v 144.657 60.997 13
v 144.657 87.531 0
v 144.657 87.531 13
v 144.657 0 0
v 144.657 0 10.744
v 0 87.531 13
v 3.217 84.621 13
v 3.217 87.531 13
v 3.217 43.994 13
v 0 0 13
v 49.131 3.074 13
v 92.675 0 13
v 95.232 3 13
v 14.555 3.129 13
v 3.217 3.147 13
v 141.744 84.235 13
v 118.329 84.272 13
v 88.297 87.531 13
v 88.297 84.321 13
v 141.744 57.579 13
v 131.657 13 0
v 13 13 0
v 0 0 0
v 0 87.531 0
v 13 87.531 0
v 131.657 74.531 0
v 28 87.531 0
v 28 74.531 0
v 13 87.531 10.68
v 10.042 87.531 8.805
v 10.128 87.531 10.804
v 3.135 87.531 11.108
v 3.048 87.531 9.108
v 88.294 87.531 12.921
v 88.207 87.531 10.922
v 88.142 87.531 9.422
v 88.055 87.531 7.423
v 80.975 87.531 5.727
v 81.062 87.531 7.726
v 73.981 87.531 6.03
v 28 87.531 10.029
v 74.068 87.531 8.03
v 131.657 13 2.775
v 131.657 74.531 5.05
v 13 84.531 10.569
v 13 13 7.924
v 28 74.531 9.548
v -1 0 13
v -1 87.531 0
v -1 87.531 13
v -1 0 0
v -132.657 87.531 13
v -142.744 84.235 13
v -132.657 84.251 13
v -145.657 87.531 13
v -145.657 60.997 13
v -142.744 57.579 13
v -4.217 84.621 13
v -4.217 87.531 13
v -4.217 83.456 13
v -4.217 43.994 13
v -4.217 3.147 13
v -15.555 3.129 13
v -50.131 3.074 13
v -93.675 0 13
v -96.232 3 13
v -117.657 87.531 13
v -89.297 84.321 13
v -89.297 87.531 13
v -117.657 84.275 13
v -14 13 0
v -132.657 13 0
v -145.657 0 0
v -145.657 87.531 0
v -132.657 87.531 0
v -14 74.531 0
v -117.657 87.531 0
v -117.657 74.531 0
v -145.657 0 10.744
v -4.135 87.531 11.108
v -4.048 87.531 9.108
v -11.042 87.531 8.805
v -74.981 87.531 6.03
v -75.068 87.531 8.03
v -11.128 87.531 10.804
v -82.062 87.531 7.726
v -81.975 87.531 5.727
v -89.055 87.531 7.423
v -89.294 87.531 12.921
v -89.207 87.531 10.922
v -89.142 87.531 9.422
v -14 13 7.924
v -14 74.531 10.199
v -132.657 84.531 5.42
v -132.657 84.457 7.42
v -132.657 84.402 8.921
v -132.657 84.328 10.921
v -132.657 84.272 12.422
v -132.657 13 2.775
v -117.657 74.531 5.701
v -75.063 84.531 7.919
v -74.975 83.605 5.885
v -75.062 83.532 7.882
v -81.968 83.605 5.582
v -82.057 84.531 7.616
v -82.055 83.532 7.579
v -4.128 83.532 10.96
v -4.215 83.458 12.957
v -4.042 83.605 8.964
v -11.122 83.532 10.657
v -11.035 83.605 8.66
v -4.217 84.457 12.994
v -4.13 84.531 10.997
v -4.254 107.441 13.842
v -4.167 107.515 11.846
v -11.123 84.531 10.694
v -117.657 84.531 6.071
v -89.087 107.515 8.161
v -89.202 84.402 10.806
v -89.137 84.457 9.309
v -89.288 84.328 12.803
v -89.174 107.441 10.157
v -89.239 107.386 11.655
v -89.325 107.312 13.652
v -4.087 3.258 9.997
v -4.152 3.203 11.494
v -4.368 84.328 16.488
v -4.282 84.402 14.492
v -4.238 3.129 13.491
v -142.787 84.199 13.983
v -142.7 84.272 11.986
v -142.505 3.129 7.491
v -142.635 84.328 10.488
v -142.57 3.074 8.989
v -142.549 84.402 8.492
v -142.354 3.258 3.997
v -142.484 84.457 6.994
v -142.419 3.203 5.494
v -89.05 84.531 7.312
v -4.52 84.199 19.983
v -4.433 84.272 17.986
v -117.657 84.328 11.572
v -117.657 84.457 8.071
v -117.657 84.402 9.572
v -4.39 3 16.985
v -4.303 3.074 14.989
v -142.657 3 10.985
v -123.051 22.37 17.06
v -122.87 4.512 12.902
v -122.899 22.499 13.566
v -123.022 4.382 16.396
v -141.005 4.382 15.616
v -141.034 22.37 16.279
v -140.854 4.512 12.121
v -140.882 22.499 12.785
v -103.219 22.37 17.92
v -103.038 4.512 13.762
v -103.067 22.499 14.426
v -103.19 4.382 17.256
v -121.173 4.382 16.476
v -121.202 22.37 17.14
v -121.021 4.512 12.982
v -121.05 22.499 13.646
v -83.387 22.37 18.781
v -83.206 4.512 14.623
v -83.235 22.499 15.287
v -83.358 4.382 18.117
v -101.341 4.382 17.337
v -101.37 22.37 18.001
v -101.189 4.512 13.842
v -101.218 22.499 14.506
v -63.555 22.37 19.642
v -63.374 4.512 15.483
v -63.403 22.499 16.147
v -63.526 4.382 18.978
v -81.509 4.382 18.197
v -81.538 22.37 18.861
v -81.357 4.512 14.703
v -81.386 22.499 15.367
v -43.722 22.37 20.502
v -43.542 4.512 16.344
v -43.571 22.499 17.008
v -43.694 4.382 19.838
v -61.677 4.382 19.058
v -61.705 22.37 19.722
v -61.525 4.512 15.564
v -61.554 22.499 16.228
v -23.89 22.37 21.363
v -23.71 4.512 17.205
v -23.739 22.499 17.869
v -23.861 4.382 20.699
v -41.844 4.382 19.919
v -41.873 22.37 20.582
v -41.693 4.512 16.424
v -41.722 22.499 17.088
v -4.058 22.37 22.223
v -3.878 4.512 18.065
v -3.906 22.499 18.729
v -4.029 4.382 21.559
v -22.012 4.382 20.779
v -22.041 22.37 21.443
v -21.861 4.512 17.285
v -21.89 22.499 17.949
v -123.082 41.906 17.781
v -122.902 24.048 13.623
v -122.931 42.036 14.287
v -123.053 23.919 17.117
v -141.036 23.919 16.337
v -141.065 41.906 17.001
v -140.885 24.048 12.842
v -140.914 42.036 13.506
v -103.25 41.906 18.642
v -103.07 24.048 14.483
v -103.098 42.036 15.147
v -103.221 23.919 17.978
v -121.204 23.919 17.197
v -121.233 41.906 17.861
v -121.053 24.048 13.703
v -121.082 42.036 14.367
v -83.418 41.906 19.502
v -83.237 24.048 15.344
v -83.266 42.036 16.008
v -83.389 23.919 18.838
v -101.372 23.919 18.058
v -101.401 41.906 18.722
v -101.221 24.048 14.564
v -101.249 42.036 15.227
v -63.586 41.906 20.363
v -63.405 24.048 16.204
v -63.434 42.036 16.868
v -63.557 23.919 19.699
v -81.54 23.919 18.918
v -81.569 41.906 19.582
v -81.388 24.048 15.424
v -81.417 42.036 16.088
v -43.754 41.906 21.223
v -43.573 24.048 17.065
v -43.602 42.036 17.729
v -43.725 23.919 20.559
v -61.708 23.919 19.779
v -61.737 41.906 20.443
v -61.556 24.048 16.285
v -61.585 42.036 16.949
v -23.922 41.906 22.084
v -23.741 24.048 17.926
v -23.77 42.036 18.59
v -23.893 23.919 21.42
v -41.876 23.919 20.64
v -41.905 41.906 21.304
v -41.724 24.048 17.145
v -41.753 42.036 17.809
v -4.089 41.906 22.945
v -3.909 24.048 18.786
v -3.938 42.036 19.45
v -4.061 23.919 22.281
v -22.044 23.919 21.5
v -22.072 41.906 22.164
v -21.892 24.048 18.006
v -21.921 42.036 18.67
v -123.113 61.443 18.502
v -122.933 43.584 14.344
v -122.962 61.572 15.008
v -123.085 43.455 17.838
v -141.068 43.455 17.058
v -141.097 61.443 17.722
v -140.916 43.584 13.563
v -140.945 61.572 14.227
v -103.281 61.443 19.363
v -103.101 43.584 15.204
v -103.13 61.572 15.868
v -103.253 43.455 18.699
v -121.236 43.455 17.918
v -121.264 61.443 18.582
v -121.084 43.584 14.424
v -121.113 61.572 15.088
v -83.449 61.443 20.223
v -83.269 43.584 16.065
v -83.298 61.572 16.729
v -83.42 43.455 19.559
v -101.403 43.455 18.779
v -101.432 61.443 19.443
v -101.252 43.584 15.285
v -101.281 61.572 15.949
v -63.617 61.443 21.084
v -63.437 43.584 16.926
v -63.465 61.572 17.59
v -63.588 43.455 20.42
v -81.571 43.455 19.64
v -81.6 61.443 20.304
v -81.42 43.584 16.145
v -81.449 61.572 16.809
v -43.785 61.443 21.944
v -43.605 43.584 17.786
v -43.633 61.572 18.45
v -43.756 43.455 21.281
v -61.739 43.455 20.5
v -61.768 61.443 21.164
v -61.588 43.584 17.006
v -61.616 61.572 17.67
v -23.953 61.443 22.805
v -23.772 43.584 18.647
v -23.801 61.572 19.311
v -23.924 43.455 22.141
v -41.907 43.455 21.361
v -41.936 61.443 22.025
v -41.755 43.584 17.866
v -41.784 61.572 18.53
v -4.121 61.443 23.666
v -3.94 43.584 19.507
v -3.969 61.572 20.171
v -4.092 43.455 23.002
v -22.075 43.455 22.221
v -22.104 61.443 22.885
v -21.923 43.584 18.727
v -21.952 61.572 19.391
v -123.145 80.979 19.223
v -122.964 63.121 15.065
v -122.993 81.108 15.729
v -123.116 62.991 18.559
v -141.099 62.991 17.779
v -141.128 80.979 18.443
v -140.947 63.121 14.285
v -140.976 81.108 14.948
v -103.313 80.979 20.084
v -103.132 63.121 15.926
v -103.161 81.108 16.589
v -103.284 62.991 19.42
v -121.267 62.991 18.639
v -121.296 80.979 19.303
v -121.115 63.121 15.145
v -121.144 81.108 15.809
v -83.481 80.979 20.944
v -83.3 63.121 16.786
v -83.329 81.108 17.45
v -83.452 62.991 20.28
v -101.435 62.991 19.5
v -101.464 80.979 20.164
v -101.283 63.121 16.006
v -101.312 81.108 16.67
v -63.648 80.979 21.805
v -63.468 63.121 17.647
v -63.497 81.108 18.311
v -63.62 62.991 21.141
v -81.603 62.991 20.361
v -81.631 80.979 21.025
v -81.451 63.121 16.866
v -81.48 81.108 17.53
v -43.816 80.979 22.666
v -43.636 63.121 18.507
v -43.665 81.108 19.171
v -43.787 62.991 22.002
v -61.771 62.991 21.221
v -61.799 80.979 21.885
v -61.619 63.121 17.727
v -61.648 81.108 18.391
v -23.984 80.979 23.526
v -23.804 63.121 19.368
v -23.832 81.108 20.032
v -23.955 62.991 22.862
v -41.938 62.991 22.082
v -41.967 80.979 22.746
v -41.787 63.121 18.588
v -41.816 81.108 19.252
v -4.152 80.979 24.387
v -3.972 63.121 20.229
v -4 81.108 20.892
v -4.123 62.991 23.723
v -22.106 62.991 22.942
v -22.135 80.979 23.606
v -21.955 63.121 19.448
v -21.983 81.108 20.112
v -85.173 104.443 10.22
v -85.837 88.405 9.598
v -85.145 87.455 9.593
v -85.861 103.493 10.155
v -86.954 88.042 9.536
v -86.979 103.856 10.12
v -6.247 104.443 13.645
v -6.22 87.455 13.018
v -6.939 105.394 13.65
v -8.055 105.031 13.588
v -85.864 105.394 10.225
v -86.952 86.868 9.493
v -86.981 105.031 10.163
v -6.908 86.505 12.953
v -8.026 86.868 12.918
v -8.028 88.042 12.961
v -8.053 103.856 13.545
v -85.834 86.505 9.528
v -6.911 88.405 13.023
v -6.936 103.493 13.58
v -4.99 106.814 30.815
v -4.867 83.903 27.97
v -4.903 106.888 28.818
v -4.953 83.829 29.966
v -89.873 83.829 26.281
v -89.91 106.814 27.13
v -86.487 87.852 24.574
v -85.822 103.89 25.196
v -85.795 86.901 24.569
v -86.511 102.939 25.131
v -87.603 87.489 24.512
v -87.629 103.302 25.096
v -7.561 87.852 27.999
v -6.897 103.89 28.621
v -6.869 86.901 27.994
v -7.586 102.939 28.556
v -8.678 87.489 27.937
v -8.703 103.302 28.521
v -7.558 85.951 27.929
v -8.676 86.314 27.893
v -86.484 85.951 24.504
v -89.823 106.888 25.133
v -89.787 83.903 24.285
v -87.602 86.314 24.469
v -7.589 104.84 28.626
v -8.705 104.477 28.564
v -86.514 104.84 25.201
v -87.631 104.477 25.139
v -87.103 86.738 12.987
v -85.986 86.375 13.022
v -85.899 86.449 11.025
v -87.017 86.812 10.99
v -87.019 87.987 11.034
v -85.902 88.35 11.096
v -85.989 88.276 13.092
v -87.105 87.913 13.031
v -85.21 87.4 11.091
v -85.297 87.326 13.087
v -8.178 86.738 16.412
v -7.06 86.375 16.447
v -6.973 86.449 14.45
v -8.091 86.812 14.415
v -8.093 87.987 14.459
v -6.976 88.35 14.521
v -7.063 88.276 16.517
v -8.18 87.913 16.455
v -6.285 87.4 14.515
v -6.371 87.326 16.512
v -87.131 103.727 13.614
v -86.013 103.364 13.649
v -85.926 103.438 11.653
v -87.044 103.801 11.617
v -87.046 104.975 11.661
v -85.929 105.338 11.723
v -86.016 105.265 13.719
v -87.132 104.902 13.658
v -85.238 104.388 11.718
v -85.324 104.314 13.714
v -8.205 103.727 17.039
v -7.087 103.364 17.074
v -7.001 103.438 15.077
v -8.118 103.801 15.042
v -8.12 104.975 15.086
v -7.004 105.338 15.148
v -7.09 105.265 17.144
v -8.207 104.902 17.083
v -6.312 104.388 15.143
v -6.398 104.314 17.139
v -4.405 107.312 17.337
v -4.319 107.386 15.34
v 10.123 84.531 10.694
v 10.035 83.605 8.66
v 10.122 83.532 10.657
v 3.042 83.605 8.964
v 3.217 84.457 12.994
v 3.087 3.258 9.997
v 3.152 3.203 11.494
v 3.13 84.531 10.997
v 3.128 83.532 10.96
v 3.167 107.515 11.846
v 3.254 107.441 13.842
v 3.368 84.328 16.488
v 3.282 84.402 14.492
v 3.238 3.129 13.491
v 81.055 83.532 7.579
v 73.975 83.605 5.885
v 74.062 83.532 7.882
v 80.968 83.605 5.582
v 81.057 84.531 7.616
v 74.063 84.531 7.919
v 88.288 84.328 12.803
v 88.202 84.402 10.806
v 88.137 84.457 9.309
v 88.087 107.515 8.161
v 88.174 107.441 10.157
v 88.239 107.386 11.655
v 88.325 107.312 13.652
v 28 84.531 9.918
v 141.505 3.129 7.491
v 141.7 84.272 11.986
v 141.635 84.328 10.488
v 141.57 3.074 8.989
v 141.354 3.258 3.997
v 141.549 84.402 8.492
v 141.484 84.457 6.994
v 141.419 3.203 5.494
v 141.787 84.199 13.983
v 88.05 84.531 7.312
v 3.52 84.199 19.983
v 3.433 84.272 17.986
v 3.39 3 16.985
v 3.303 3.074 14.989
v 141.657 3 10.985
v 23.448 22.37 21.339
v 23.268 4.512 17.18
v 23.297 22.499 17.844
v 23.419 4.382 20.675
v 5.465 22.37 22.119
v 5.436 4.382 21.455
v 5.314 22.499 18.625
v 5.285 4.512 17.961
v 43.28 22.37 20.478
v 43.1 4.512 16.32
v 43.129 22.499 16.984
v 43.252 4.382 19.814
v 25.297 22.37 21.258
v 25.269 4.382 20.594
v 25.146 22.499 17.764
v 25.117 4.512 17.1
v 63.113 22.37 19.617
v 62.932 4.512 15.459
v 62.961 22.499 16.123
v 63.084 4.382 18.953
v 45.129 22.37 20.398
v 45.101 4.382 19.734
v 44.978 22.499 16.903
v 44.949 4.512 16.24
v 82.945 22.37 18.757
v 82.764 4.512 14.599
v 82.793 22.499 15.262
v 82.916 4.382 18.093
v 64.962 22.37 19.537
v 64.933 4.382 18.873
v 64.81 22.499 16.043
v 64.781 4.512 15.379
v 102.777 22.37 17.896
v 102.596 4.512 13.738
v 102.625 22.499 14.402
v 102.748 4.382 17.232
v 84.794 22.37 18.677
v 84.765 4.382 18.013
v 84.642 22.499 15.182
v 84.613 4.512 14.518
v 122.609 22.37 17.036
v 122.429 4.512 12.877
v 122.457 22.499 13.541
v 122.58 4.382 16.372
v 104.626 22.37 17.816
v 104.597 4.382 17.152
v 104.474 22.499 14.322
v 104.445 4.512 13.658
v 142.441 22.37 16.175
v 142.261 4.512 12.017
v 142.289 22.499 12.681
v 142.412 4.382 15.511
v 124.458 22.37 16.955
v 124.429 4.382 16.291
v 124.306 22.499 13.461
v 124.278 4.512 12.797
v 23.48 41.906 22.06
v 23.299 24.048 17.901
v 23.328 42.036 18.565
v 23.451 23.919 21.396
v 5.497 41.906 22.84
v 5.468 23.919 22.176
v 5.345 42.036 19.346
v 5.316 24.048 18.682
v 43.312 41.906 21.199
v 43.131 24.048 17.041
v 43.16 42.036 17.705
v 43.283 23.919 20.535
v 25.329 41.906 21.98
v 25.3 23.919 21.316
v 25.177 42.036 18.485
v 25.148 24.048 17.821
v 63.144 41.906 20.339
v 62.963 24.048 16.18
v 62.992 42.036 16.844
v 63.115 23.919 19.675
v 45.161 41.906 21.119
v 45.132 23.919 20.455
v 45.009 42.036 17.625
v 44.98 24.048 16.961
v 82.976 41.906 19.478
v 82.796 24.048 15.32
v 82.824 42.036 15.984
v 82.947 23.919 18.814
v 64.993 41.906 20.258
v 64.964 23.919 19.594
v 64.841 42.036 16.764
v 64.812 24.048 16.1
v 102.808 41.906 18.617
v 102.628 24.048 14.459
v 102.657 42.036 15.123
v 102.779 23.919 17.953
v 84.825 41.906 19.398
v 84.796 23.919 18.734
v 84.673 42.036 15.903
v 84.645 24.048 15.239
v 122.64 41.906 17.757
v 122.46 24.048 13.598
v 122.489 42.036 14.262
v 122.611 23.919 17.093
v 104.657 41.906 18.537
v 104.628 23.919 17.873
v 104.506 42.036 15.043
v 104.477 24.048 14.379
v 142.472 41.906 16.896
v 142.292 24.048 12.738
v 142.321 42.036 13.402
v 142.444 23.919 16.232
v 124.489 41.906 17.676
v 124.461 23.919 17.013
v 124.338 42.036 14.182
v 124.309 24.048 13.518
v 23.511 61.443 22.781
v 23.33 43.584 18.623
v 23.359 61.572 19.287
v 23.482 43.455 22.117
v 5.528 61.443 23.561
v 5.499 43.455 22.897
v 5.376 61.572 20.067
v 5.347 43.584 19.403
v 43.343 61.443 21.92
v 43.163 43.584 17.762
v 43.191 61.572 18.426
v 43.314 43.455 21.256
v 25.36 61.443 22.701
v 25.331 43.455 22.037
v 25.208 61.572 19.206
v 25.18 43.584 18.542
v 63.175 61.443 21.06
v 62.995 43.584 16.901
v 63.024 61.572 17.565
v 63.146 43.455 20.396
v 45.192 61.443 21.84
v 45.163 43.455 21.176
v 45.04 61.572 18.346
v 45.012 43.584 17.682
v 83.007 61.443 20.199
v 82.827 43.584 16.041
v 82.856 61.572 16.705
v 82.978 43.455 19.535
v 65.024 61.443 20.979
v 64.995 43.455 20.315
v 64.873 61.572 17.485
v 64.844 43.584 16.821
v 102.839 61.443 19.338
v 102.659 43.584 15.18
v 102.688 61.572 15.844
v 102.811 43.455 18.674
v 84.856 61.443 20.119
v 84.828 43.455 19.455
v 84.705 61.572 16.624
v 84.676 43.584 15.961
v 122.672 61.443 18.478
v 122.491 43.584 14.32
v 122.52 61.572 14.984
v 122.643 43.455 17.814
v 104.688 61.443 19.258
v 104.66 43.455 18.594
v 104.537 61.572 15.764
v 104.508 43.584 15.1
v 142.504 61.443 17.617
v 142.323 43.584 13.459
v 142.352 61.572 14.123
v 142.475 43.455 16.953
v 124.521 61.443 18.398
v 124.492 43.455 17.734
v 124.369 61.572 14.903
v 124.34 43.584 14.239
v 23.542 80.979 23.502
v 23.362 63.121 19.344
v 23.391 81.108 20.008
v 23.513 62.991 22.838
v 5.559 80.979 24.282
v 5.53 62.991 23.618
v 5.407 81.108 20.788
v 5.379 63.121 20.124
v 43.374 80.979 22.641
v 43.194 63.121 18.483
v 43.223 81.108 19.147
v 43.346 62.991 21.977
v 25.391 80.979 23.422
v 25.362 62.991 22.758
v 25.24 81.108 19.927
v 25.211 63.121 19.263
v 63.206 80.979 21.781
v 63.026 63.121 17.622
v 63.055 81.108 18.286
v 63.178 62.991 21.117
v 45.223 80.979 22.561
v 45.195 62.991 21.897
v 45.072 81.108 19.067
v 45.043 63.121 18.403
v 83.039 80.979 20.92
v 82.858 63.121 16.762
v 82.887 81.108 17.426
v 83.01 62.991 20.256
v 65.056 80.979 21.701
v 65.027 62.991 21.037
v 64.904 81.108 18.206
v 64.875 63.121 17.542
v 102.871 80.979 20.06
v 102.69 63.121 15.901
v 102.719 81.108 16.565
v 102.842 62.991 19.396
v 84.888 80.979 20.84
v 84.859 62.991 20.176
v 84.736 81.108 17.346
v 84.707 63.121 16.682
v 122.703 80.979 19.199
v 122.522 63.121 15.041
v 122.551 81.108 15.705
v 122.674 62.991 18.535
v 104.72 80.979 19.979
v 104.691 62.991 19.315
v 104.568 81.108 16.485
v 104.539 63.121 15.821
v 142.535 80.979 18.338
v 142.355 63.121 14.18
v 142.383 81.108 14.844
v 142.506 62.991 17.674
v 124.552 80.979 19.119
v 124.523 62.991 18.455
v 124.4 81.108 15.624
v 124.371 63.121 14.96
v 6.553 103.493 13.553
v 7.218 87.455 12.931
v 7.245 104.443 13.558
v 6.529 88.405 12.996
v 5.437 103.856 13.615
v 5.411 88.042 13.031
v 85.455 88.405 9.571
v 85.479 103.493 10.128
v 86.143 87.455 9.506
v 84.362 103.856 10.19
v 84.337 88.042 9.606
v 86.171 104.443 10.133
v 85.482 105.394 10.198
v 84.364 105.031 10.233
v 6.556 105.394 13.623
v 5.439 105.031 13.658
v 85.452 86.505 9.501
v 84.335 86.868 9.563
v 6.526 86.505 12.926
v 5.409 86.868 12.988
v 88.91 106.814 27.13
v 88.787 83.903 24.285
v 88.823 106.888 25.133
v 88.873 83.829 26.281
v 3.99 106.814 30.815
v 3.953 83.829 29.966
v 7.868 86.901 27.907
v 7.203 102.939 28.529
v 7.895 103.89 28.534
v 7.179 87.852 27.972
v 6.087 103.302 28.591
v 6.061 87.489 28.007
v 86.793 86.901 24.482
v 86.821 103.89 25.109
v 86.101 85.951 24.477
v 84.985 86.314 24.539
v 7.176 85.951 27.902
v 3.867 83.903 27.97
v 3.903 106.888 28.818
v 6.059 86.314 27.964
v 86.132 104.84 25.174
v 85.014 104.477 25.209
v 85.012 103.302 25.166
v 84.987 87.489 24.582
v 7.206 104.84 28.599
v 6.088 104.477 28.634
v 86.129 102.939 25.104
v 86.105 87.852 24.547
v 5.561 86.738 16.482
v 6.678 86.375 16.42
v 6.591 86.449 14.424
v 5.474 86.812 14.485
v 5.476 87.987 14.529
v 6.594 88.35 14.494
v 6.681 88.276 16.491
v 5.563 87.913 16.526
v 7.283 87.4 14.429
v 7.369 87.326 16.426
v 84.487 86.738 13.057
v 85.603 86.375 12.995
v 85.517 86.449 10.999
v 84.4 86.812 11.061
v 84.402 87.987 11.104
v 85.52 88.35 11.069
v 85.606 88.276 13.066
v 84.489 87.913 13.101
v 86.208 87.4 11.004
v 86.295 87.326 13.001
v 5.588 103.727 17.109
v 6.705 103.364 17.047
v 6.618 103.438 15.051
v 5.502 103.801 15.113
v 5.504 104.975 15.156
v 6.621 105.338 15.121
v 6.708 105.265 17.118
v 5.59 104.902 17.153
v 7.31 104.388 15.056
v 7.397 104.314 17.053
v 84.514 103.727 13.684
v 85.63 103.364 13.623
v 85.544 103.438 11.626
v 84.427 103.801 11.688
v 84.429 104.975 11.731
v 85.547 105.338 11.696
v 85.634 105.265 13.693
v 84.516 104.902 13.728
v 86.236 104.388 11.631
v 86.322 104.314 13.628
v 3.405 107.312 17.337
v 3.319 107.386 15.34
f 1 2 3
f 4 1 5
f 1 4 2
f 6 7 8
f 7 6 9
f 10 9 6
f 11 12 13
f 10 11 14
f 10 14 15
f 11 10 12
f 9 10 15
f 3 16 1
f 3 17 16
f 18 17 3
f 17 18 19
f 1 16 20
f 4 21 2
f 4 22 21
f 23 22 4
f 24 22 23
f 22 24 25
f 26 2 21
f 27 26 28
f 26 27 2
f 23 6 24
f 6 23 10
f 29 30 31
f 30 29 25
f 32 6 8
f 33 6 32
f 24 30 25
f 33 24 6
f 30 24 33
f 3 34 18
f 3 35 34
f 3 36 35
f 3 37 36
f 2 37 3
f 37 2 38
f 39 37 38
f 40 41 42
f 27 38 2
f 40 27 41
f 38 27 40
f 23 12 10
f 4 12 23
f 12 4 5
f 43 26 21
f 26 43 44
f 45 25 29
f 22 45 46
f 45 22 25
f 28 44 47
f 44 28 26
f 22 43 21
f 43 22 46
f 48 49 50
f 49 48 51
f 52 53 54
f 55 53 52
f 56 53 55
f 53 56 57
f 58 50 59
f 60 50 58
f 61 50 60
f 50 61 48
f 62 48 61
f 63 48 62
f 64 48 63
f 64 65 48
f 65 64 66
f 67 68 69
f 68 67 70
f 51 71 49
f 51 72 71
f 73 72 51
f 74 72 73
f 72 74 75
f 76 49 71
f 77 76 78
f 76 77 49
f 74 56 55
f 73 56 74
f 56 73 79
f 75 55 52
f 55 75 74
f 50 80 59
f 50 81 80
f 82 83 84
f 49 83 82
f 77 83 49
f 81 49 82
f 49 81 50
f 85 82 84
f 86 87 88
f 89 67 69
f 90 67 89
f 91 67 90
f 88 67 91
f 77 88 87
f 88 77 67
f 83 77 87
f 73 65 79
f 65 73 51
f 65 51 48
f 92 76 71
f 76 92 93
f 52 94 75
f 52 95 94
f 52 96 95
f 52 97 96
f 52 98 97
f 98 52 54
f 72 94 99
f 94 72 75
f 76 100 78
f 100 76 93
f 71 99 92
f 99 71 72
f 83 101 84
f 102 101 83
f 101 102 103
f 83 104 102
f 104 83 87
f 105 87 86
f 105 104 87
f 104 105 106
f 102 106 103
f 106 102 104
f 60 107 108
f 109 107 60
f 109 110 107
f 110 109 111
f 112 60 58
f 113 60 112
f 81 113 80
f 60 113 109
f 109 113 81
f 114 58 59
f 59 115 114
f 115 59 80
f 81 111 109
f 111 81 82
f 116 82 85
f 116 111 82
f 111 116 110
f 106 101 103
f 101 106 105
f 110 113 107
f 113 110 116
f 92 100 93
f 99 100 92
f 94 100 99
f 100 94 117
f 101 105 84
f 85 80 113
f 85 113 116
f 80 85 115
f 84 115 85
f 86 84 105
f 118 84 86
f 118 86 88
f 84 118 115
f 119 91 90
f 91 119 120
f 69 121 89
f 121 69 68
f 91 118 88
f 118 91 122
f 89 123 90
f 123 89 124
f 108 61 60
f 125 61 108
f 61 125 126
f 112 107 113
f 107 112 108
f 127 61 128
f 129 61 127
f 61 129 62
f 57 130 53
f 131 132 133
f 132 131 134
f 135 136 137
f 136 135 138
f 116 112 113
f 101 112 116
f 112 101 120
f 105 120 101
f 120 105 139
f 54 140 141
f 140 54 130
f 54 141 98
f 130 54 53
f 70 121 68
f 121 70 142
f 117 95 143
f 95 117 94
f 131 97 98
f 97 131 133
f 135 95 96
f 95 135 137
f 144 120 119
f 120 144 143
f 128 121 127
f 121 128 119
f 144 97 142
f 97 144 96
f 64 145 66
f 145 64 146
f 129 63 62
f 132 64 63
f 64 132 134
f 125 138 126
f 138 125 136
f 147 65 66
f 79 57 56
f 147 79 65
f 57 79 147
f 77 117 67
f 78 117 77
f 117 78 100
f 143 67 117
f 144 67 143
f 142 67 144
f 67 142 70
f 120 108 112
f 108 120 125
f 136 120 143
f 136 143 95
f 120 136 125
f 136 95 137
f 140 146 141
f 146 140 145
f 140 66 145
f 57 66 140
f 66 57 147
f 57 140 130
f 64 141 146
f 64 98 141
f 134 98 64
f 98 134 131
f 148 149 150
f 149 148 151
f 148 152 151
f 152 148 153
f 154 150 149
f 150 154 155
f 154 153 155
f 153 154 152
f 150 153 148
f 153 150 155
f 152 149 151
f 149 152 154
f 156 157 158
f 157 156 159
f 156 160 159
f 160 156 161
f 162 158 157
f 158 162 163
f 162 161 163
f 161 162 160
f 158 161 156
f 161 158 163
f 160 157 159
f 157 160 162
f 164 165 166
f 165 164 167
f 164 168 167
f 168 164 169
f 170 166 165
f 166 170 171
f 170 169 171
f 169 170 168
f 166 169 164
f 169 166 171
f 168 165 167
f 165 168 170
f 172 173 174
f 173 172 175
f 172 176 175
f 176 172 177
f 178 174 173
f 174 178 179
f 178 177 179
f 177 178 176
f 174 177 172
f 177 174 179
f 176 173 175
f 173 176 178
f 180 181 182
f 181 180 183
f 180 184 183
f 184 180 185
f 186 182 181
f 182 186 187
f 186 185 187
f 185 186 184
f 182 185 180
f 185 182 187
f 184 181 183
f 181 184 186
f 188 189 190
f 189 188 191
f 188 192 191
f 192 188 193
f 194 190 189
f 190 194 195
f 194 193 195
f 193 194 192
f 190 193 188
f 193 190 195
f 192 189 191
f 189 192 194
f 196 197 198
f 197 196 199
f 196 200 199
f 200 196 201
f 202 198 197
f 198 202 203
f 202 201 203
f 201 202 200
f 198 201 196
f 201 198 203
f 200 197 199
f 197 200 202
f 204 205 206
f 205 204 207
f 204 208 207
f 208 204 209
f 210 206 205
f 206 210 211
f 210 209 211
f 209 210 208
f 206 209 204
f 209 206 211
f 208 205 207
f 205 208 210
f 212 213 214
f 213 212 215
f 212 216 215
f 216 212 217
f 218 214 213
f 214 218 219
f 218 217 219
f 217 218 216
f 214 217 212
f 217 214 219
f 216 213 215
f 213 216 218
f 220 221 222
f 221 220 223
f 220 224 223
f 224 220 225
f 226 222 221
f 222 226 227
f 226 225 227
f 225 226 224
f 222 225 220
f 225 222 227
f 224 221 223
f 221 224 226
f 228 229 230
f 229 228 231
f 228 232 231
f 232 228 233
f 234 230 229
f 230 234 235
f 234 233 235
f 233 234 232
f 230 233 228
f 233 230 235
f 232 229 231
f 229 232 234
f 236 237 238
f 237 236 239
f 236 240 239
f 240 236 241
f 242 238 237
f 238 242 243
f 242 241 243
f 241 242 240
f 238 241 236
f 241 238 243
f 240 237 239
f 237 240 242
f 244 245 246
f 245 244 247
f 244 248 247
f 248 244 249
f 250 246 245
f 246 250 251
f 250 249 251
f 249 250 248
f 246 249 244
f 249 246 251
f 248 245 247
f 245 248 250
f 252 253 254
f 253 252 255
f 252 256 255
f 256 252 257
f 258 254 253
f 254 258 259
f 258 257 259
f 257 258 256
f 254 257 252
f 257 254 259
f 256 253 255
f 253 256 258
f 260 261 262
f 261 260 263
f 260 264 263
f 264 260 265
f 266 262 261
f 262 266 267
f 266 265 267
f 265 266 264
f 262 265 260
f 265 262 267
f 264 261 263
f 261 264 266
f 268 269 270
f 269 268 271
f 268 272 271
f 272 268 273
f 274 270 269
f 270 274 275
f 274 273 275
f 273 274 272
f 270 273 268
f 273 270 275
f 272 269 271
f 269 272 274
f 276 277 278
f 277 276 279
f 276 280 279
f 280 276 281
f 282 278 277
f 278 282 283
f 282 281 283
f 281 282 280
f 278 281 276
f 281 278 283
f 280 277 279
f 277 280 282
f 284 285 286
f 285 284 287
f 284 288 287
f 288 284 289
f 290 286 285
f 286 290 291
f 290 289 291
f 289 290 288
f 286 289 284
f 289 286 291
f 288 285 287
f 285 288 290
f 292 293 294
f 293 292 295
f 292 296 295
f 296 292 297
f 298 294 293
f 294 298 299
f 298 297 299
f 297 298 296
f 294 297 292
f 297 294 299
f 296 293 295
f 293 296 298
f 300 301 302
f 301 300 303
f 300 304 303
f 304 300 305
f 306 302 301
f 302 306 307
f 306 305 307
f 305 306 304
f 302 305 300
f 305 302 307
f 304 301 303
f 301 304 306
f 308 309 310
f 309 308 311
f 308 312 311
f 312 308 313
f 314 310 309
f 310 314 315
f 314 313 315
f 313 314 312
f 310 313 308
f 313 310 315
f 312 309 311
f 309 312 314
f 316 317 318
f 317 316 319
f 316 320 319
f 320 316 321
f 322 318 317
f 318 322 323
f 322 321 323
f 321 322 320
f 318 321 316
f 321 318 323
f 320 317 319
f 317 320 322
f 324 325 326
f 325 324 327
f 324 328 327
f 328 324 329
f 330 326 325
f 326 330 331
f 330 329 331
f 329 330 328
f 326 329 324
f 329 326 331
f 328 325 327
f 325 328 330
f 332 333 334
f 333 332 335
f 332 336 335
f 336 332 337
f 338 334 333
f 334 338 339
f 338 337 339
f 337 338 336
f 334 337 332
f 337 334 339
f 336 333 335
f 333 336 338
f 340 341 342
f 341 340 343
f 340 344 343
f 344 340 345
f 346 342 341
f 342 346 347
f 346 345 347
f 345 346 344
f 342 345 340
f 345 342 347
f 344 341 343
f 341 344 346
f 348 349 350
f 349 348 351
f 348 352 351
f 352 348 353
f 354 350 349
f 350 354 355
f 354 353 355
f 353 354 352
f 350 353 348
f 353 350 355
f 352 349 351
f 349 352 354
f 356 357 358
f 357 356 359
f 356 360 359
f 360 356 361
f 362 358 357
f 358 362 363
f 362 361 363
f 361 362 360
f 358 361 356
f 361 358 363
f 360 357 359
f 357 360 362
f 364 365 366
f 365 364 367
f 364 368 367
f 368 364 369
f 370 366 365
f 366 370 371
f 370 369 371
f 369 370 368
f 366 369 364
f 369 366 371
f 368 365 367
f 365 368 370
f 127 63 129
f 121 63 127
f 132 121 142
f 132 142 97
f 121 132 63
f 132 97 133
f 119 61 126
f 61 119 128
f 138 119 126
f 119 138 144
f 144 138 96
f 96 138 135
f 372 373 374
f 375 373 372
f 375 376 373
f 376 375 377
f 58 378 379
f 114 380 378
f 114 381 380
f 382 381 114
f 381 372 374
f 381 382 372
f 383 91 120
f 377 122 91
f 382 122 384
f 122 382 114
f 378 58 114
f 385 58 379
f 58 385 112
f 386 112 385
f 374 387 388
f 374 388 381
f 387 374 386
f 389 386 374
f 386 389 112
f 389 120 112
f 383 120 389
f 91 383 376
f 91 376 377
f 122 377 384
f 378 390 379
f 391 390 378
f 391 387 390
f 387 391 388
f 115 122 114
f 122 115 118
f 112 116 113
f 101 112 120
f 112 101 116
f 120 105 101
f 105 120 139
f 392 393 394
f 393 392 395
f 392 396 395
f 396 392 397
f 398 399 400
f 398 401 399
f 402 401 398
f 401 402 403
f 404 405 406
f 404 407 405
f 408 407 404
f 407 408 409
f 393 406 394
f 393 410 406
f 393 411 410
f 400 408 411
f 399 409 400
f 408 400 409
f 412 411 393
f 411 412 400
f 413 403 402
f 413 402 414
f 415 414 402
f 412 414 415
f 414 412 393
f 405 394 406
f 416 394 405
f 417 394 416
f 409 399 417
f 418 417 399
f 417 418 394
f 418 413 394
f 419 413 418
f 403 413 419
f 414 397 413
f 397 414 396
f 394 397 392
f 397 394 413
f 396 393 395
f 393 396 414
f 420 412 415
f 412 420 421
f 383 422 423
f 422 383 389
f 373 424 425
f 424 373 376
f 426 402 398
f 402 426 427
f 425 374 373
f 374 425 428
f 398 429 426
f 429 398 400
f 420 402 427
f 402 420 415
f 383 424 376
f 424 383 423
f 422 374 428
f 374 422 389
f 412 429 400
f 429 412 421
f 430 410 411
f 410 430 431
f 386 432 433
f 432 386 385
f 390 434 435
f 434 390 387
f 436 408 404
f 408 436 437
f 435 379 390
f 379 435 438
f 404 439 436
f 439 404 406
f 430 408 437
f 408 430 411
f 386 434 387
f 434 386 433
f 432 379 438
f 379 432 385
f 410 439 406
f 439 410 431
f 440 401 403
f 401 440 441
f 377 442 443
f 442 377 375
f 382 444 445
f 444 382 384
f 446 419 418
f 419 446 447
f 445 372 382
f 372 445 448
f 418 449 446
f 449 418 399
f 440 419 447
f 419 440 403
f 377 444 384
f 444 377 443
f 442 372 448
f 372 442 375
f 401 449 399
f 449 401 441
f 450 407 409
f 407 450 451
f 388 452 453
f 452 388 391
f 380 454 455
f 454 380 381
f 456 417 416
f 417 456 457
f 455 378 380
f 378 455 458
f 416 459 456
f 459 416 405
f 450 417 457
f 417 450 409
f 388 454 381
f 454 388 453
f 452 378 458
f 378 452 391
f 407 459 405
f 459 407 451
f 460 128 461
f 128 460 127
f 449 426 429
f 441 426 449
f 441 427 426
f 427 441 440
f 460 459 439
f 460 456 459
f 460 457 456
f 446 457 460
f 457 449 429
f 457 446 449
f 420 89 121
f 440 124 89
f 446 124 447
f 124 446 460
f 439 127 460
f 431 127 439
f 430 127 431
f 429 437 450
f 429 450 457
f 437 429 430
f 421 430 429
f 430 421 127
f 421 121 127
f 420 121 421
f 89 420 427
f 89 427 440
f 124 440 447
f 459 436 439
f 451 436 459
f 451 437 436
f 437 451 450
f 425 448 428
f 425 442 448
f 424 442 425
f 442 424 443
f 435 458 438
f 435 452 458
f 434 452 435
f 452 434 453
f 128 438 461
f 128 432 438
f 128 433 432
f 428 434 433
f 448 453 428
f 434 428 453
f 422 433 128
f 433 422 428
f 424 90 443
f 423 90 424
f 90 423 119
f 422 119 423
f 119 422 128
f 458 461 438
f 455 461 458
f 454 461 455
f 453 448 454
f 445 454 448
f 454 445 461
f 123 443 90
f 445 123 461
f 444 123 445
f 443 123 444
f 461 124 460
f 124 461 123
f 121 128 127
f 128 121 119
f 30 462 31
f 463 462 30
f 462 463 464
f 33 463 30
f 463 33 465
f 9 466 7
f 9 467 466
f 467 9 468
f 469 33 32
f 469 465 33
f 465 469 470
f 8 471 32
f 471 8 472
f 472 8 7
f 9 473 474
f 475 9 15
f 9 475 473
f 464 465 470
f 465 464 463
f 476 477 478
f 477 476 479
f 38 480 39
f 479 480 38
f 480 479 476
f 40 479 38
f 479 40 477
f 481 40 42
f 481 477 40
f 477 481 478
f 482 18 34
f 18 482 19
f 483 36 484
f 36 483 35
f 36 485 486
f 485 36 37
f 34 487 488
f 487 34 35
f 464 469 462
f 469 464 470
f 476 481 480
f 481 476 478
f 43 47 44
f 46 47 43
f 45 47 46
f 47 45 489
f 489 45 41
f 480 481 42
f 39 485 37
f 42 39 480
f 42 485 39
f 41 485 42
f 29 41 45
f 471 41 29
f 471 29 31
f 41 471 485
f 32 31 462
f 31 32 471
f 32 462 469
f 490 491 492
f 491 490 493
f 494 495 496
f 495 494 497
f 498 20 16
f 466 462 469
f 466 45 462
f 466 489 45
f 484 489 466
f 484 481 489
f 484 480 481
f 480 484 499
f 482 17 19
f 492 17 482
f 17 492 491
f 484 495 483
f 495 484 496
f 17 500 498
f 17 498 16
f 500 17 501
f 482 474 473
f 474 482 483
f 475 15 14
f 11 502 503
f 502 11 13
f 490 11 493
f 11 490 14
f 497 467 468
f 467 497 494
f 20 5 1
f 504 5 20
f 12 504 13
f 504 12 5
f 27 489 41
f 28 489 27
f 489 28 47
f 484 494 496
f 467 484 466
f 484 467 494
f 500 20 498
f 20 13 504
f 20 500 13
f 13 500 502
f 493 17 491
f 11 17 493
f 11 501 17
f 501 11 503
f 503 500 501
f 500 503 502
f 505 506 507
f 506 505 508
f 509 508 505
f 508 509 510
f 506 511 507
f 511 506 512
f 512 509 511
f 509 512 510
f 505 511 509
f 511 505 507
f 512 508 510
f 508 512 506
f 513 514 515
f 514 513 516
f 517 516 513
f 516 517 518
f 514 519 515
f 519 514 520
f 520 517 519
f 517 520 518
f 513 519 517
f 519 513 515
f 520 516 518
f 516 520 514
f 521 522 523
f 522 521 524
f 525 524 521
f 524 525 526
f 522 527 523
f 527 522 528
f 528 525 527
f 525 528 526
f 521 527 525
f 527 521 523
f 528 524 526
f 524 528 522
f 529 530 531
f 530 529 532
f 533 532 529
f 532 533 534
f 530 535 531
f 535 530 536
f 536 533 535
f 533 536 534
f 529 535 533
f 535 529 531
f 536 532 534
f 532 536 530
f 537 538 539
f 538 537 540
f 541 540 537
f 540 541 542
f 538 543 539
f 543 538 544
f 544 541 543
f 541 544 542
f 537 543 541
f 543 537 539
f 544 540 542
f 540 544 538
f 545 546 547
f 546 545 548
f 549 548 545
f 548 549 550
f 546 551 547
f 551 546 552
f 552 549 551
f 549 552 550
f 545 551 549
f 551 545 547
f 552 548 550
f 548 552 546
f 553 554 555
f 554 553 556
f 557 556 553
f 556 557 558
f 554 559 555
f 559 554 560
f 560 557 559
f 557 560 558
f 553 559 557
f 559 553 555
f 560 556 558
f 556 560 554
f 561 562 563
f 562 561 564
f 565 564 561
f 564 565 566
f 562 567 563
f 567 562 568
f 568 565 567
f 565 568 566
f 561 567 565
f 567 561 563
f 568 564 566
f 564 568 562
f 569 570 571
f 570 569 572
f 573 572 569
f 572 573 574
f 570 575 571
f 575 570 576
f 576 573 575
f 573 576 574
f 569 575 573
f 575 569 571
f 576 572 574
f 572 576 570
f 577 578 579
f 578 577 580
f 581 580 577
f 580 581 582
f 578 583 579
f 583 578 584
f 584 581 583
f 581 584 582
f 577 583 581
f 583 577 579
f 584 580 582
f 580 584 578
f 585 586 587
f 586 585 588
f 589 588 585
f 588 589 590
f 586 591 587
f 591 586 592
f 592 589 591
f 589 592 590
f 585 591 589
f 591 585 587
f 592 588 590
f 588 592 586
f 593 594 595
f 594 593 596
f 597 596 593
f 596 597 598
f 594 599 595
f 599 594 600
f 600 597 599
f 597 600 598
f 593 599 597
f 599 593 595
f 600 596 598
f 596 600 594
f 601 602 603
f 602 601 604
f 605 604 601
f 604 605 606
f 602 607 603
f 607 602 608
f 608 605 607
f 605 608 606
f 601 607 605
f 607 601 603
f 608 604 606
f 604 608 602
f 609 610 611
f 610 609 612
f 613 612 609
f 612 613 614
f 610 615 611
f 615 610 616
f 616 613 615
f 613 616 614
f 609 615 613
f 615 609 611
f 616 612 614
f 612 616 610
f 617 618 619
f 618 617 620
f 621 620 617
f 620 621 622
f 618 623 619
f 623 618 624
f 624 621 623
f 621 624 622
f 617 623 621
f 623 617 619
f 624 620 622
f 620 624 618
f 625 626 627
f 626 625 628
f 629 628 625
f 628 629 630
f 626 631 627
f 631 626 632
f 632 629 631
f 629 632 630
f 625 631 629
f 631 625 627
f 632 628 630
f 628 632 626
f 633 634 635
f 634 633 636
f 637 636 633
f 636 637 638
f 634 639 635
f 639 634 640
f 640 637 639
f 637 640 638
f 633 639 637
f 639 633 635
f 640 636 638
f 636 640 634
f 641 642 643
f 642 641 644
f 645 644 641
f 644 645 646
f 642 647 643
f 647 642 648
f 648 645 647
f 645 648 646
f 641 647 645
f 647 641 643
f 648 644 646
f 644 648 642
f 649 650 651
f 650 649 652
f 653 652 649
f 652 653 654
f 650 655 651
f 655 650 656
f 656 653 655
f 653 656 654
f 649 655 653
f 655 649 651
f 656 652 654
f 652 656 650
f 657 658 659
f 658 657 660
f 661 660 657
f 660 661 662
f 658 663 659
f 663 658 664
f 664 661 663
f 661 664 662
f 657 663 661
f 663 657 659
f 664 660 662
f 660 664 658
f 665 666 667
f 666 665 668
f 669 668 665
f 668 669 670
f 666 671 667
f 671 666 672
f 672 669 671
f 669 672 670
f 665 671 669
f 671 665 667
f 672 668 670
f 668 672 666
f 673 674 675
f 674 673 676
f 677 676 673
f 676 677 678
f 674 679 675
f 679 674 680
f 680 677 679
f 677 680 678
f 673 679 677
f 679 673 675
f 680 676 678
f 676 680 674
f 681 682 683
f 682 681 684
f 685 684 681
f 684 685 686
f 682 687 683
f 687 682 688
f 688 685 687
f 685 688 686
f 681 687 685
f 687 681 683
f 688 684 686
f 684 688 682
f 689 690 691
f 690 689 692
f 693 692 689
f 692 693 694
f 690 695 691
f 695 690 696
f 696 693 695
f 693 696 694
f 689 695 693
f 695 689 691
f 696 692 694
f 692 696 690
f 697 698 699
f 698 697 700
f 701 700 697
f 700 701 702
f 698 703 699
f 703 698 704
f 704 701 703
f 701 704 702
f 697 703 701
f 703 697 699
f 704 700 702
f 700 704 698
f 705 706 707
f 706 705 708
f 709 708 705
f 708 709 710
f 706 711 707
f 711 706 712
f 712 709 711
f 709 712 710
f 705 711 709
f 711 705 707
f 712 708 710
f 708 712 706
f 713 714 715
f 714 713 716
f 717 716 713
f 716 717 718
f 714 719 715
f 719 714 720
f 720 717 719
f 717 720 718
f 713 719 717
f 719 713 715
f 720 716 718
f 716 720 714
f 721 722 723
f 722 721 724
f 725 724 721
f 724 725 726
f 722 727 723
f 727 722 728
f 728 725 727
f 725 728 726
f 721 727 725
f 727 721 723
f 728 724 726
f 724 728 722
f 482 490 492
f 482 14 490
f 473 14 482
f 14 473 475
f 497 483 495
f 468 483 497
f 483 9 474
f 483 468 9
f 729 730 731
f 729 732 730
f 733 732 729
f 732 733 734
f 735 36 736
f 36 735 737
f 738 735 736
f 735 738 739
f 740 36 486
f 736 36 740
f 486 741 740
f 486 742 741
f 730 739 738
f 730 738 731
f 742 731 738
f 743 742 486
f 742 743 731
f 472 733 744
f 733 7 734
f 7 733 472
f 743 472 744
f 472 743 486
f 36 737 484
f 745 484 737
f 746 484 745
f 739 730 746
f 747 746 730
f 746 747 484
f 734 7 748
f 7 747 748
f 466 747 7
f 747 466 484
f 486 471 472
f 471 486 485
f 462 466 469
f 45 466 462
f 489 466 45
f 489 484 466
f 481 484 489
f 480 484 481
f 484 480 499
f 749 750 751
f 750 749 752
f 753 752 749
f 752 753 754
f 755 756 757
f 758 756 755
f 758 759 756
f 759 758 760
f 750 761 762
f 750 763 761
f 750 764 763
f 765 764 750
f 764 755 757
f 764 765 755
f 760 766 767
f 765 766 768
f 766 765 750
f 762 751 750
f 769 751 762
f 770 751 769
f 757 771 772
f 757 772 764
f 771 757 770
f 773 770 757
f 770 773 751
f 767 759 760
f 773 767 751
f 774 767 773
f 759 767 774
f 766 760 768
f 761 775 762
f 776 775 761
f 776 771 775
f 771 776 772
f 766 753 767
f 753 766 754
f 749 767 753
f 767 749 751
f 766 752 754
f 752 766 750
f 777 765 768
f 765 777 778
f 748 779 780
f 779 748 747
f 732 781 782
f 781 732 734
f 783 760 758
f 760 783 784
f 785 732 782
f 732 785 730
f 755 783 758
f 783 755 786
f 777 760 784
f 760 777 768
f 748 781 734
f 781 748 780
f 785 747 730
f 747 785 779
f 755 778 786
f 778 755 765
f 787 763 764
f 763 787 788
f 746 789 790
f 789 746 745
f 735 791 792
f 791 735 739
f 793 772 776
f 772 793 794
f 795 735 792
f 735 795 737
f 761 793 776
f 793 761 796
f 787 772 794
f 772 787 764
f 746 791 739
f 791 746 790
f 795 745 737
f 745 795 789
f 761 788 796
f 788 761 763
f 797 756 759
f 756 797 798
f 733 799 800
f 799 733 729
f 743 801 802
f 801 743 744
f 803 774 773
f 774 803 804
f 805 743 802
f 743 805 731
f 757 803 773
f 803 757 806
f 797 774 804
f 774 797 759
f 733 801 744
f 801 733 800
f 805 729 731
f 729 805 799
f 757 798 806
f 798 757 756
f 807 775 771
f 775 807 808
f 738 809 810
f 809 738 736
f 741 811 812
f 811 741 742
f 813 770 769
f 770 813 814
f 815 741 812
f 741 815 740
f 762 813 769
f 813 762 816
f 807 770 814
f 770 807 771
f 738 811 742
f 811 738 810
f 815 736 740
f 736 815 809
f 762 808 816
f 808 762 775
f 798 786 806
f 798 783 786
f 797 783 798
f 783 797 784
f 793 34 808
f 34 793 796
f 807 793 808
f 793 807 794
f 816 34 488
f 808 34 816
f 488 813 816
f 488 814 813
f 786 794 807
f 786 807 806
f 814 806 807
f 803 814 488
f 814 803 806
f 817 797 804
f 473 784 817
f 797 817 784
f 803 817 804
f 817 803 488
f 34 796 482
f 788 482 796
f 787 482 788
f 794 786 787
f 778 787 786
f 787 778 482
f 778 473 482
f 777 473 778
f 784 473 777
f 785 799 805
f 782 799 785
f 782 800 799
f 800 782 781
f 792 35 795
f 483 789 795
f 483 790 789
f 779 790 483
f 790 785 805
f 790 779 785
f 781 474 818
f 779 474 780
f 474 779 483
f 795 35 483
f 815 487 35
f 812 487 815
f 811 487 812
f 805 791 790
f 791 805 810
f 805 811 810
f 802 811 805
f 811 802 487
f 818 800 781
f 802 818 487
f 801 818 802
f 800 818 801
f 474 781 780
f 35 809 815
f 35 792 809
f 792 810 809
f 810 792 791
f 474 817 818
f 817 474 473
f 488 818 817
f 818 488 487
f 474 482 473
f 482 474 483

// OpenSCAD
// ERGO42 SPEC
ERGO_HEIGHT     = 81.254;  // 真上から見た時の高さ（マイコン部除く） ... 公式情報
ERGO_WIDTH      = 138.397; // 真上から見た時の幅（マイコン除く） ... 公式情報
PROMICRO_HEIGHT = 23;      // マイコン部の高さ ... 実測
PROMICRO_WIDTH  = 85;      // マイコン部の幅 ... 実測

// CONFIGURATIONS
PLATE_THICKNESS             = 2;  // アクリル板の厚み
ERGO_STANDOFF_THICKNESS     = 5;  // アクリル板間のスペーサの高さ（キーボード部）
PROMICRO_STANDOFF_THICKNESS = 15; // アクリル板間のスペーサの高さ（マイコン部）
OFFSET_H                    = 6;  // 外側より内側をどれだけ高くするか
OFFSET_V                    = 3;  // 手前より奥をどれだけ高くするか
WALL_THICKNESS              = 3;  // 壁の厚さ
BOTTOM_THICKNESS            = 2;  // 底の厚さ
BOTTOM_WIDTH                = 10; // 底のキーボードを支える部分の幅
BOX_THICKNESS_LIMIT         = 13; // 箱全体の最大厚さ
//BOX_THICKNESS_LIMIT         = 21; // 箱全体の最大厚さ
SCREW_AREA_WIDTH            = 7;  // ネジ頭の直径（より大きめ）
SCREW_AREA_THICKNESS        = 2;  // ネジ頭の厚さ（より大きめ）
SCREW_AREA_MARGIN_OUTER     = 7;  // マイコンの端（外側）からネジ頭までの距離（より小さめ）
SCREW_AREA_MARGIN_INNER     = 0;  // マイコンの端（内側）からネジ頭までの距離（より小さめ）

// COMPUTED CONSTANTS
ERGO_THICKNESS        = PLATE_THICKNESS * 2 + ERGO_STANDOFF_THICKNESS;
PROMICRO_THICKNESS    = PLATE_THICKNESS * 2 + PROMICRO_STANDOFF_THICKNESS;
ANGLE_X               = asin(OFFSET_H / ERGO_WIDTH);
ANGLE_Y               = asin(OFFSET_V / ERGO_HEIGHT);
THICKNESS_OFFSET_X    = ERGO_THICKNESS * sin(ANGLE_X);
THICKNESS_OFFSET_Y    = ERGO_THICKNESS * sin(ANGLE_Y);
ANGLED_ERGO_WIDTH     = ERGO_WIDTH * cos(ANGLE_X) + THICKNESS_OFFSET_X;
ANGLED_ERGO_HEIGHT    = ERGO_HEIGHT * cos(ANGLE_Y) + THICKNESS_OFFSET_Y;
ANGLED_ERGO_THICKNESS = ERGO_THICKNESS + OFFSET_H + OFFSET_V;
BOX_WIDTH             = ANGLED_ERGO_WIDTH + WALL_THICKNESS * 2;
BOX_HEIGHT            = ANGLED_ERGO_HEIGHT + WALL_THICKNESS * 2;
BOTTOM_HOLE_MARGIN    = WALL_THICKNESS + BOTTOM_WIDTH;

// -------- for previewing
pcb_thickness = 2;
module ergo42Kb () {
    key_size      = 18;
    key_thickness = 3.5;
    key_v_margin  = (ERGO_WIDTH - key_size * 7) / 8;
    key_h_margin  = (ERGO_HEIGHT - key_size * 4) / 5;
    color([0.8, 0.8, 0.8, 0.3])
        for (z = [0, PLATE_THICKNESS + ERGO_STANDOFF_THICKNESS])
            translate([0, 0, z])
                cube([ERGO_WIDTH, ERGO_HEIGHT, PLATE_THICKNESS]);
    color([0.2, 0.2, 0.2, 0.5])
        translate([0, 0, PLATE_THICKNESS + (ERGO_STANDOFF_THICKNESS - pcb_thickness) / 2])
            cube([ERGO_WIDTH, ERGO_HEIGHT, pcb_thickness]);
    color([0.4, 0.4, 0.4, 0.5])
        for (y = [0, 1, 2, 3])
            for (x = [0, 1, 2, 3, 4, 5, 6])
                translate([key_h_margin  + (key_size + key_h_margin) * x,
                           key_v_margin  + (key_size + key_v_margin) * y, ERGO_THICKNESS + 1])
                    cube([key_size, key_size, key_thickness]);
}
module ergo42Promicro () {
    sp_r          = 1;
    sp_margin     = 2;
    color([0.8, 0.8, 0.8, 0.3])
        for (z = [0, PLATE_THICKNESS + PROMICRO_STANDOFF_THICKNESS])
            translate([0, 0, z])
                cube([PROMICRO_WIDTH, PROMICRO_HEIGHT, PLATE_THICKNESS]);
    color([0.2, 0.2, 0.2, 0.5])
        translate([0, 0, PLATE_THICKNESS + (ERGO_STANDOFF_THICKNESS - pcb_thickness) / 2])
            cube([PROMICRO_WIDTH, PROMICRO_HEIGHT, pcb_thickness]);
    color([0.6, 0.6, 0.6, 0.5])
        for (y = [sp_margin + sp_r, PROMICRO_HEIGHT - sp_margin - sp_r])
            for (x = [sp_margin + sp_r, PROMICRO_WIDTH - sp_margin - sp_r])
                translate([x, y, PLATE_THICKNESS])
                    cylinder(r = sp_r, h = PROMICRO_STANDOFF_THICKNESS);
}
module ergo42R () {
    ergo42Kb();
    translate([0, ERGO_HEIGHT, 0]) ergo42Promicro();
}
module ergo42L () {
    ergo42Kb();
    translate([ERGO_WIDTH - PROMICRO_WIDTH, ERGO_HEIGHT, 0]) ergo42Promicro();
}
// --------

module tiltL () {
    translate([THICKNESS_OFFSET_X, THICKNESS_OFFSET_Y, 0])
        rotate([ANGLE_Y, -ANGLE_X, 0]) {
            children();
        }
}

module tiltR () {
    translate([ANGLED_ERGO_WIDTH - THICKNESS_OFFSET_X, THICKNESS_OFFSET_Y, 0])
        rotate([ANGLE_Y, ANGLE_X, 0])
            translate([-ERGO_WIDTH, 0, 0]) {
                children();
            }
}

module boxCube () {
    hole_width  = max(0, BOX_WIDTH - BOTTOM_HOLE_MARGIN * 2);
    hole_height = max(0, BOX_HEIGHT - BOTTOM_HOLE_MARGIN * 2);
    difference () {
        // base
        cube([BOX_WIDTH, BOX_HEIGHT, BOX_THICKNESS_LIMIT]);
        // hole of the bottom plate
        translate([BOTTOM_HOLE_MARGIN, BOTTOM_HOLE_MARGIN, -1])
            cube([hole_width, hole_height, BOX_THICKNESS_LIMIT]);
    }
}

module caseL () {
    difference () {
        boxCube();
        // ergo42
        translate([WALL_THICKNESS, WALL_THICKNESS, BOTTOM_THICKNESS]) tiltL() {
            // keyboard
            cube([ERGO_WIDTH, ERGO_HEIGHT, ERGO_THICKNESS + 1]);
            // promicro
            translate([ERGO_WIDTH - PROMICRO_WIDTH, ERGO_HEIGHT - 1, 0]) {
                cube([PROMICRO_WIDTH, PROMICRO_HEIGHT + 1, PROMICRO_THICKNESS]);
                for (x = [SCREW_AREA_MARGIN_OUTER, PROMICRO_WIDTH - SCREW_AREA_MARGIN_INNER - SCREW_AREA_WIDTH])
                    translate([x, 0, -SCREW_AREA_THICKNESS])
                        cube([SCREW_AREA_WIDTH, 100, SCREW_AREA_THICKNESS + 1]);
            }
            // upper-limit
            translate([-50, -50, ERGO_THICKNESS])
                cube([ERGO_WIDTH + 100, ERGO_HEIGHT + 100, BOX_THICKNESS_LIMIT]);
        }
    }
}

module caseR () {
    difference () {
        boxCube();
        // ergo42
        translate([WALL_THICKNESS, WALL_THICKNESS, BOTTOM_THICKNESS]) tiltR() {
            // keyboard
            cube([ERGO_WIDTH, ERGO_HEIGHT, ERGO_THICKNESS + 10]);
            // promicro
            translate([0, ERGO_HEIGHT - 1, 0]) {
                cube([PROMICRO_WIDTH, PROMICRO_HEIGHT + 1, PROMICRO_THICKNESS]);
                for (x = [SCREW_AREA_MARGIN_INNER, PROMICRO_WIDTH - SCREW_AREA_MARGIN_OUTER - SCREW_AREA_WIDTH])
                    translate([x, 0, -SCREW_AREA_THICKNESS])
                        cube([SCREW_AREA_WIDTH, 100, SCREW_AREA_THICKNESS + 1]);
            }
            // upper-limit
            translate([-50, -50, ERGO_THICKNESS])
                cube([ERGO_WIDTH + 100, ERGO_HEIGHT + 100, BOX_THICKNESS_LIMIT]);
        }
    }
}

module cheapCaseL () {
    difference () {
        caseL();
        // hole for cheaper printing
        translate([BOTTOM_HOLE_MARGIN, BOX_HEIGHT - BOTTOM_HOLE_MARGIN - 1, -1])
            cube([BOTTOM_HOLE_MARGIN + 2, BOTTOM_HOLE_MARGIN + 2, BOX_THICKNESS_LIMIT + 2]);
    }
}

module cheapCaseR () {
    difference () {
        caseR();
        // hole for cheaper printing
        translate([BOTTOM_HOLE_MARGIN, BOX_HEIGHT - BOTTOM_HOLE_MARGIN - 1, -1])
            cube([BOTTOM_HOLE_MARGIN + 2, BOTTOM_HOLE_MARGIN + 2, BOX_THICKNESS_LIMIT + 2]);
    }
}

translate([-BOX_WIDTH - 1, 0, 0]) {
    cheapCaseL();
    translate([WALL_THICKNESS, WALL_THICKNESS, BOTTOM_THICKNESS]) tiltL() ergo42L();
}
cheapCaseR();
translate([WALL_THICKNESS, WALL_THICKNESS, BOTTOM_THICKNESS]) tiltR() ergo42R();

/*
rotate([0, 0, 180])
    translate([-(BOX_WIDTH + BOTTOM_HOLE_MARGIN + 1), -(BOX_HEIGHT + BOTTOM_HOLE_MARGIN + 1), 0])
        cheapCaseL();
cheapCaseR();
*/
